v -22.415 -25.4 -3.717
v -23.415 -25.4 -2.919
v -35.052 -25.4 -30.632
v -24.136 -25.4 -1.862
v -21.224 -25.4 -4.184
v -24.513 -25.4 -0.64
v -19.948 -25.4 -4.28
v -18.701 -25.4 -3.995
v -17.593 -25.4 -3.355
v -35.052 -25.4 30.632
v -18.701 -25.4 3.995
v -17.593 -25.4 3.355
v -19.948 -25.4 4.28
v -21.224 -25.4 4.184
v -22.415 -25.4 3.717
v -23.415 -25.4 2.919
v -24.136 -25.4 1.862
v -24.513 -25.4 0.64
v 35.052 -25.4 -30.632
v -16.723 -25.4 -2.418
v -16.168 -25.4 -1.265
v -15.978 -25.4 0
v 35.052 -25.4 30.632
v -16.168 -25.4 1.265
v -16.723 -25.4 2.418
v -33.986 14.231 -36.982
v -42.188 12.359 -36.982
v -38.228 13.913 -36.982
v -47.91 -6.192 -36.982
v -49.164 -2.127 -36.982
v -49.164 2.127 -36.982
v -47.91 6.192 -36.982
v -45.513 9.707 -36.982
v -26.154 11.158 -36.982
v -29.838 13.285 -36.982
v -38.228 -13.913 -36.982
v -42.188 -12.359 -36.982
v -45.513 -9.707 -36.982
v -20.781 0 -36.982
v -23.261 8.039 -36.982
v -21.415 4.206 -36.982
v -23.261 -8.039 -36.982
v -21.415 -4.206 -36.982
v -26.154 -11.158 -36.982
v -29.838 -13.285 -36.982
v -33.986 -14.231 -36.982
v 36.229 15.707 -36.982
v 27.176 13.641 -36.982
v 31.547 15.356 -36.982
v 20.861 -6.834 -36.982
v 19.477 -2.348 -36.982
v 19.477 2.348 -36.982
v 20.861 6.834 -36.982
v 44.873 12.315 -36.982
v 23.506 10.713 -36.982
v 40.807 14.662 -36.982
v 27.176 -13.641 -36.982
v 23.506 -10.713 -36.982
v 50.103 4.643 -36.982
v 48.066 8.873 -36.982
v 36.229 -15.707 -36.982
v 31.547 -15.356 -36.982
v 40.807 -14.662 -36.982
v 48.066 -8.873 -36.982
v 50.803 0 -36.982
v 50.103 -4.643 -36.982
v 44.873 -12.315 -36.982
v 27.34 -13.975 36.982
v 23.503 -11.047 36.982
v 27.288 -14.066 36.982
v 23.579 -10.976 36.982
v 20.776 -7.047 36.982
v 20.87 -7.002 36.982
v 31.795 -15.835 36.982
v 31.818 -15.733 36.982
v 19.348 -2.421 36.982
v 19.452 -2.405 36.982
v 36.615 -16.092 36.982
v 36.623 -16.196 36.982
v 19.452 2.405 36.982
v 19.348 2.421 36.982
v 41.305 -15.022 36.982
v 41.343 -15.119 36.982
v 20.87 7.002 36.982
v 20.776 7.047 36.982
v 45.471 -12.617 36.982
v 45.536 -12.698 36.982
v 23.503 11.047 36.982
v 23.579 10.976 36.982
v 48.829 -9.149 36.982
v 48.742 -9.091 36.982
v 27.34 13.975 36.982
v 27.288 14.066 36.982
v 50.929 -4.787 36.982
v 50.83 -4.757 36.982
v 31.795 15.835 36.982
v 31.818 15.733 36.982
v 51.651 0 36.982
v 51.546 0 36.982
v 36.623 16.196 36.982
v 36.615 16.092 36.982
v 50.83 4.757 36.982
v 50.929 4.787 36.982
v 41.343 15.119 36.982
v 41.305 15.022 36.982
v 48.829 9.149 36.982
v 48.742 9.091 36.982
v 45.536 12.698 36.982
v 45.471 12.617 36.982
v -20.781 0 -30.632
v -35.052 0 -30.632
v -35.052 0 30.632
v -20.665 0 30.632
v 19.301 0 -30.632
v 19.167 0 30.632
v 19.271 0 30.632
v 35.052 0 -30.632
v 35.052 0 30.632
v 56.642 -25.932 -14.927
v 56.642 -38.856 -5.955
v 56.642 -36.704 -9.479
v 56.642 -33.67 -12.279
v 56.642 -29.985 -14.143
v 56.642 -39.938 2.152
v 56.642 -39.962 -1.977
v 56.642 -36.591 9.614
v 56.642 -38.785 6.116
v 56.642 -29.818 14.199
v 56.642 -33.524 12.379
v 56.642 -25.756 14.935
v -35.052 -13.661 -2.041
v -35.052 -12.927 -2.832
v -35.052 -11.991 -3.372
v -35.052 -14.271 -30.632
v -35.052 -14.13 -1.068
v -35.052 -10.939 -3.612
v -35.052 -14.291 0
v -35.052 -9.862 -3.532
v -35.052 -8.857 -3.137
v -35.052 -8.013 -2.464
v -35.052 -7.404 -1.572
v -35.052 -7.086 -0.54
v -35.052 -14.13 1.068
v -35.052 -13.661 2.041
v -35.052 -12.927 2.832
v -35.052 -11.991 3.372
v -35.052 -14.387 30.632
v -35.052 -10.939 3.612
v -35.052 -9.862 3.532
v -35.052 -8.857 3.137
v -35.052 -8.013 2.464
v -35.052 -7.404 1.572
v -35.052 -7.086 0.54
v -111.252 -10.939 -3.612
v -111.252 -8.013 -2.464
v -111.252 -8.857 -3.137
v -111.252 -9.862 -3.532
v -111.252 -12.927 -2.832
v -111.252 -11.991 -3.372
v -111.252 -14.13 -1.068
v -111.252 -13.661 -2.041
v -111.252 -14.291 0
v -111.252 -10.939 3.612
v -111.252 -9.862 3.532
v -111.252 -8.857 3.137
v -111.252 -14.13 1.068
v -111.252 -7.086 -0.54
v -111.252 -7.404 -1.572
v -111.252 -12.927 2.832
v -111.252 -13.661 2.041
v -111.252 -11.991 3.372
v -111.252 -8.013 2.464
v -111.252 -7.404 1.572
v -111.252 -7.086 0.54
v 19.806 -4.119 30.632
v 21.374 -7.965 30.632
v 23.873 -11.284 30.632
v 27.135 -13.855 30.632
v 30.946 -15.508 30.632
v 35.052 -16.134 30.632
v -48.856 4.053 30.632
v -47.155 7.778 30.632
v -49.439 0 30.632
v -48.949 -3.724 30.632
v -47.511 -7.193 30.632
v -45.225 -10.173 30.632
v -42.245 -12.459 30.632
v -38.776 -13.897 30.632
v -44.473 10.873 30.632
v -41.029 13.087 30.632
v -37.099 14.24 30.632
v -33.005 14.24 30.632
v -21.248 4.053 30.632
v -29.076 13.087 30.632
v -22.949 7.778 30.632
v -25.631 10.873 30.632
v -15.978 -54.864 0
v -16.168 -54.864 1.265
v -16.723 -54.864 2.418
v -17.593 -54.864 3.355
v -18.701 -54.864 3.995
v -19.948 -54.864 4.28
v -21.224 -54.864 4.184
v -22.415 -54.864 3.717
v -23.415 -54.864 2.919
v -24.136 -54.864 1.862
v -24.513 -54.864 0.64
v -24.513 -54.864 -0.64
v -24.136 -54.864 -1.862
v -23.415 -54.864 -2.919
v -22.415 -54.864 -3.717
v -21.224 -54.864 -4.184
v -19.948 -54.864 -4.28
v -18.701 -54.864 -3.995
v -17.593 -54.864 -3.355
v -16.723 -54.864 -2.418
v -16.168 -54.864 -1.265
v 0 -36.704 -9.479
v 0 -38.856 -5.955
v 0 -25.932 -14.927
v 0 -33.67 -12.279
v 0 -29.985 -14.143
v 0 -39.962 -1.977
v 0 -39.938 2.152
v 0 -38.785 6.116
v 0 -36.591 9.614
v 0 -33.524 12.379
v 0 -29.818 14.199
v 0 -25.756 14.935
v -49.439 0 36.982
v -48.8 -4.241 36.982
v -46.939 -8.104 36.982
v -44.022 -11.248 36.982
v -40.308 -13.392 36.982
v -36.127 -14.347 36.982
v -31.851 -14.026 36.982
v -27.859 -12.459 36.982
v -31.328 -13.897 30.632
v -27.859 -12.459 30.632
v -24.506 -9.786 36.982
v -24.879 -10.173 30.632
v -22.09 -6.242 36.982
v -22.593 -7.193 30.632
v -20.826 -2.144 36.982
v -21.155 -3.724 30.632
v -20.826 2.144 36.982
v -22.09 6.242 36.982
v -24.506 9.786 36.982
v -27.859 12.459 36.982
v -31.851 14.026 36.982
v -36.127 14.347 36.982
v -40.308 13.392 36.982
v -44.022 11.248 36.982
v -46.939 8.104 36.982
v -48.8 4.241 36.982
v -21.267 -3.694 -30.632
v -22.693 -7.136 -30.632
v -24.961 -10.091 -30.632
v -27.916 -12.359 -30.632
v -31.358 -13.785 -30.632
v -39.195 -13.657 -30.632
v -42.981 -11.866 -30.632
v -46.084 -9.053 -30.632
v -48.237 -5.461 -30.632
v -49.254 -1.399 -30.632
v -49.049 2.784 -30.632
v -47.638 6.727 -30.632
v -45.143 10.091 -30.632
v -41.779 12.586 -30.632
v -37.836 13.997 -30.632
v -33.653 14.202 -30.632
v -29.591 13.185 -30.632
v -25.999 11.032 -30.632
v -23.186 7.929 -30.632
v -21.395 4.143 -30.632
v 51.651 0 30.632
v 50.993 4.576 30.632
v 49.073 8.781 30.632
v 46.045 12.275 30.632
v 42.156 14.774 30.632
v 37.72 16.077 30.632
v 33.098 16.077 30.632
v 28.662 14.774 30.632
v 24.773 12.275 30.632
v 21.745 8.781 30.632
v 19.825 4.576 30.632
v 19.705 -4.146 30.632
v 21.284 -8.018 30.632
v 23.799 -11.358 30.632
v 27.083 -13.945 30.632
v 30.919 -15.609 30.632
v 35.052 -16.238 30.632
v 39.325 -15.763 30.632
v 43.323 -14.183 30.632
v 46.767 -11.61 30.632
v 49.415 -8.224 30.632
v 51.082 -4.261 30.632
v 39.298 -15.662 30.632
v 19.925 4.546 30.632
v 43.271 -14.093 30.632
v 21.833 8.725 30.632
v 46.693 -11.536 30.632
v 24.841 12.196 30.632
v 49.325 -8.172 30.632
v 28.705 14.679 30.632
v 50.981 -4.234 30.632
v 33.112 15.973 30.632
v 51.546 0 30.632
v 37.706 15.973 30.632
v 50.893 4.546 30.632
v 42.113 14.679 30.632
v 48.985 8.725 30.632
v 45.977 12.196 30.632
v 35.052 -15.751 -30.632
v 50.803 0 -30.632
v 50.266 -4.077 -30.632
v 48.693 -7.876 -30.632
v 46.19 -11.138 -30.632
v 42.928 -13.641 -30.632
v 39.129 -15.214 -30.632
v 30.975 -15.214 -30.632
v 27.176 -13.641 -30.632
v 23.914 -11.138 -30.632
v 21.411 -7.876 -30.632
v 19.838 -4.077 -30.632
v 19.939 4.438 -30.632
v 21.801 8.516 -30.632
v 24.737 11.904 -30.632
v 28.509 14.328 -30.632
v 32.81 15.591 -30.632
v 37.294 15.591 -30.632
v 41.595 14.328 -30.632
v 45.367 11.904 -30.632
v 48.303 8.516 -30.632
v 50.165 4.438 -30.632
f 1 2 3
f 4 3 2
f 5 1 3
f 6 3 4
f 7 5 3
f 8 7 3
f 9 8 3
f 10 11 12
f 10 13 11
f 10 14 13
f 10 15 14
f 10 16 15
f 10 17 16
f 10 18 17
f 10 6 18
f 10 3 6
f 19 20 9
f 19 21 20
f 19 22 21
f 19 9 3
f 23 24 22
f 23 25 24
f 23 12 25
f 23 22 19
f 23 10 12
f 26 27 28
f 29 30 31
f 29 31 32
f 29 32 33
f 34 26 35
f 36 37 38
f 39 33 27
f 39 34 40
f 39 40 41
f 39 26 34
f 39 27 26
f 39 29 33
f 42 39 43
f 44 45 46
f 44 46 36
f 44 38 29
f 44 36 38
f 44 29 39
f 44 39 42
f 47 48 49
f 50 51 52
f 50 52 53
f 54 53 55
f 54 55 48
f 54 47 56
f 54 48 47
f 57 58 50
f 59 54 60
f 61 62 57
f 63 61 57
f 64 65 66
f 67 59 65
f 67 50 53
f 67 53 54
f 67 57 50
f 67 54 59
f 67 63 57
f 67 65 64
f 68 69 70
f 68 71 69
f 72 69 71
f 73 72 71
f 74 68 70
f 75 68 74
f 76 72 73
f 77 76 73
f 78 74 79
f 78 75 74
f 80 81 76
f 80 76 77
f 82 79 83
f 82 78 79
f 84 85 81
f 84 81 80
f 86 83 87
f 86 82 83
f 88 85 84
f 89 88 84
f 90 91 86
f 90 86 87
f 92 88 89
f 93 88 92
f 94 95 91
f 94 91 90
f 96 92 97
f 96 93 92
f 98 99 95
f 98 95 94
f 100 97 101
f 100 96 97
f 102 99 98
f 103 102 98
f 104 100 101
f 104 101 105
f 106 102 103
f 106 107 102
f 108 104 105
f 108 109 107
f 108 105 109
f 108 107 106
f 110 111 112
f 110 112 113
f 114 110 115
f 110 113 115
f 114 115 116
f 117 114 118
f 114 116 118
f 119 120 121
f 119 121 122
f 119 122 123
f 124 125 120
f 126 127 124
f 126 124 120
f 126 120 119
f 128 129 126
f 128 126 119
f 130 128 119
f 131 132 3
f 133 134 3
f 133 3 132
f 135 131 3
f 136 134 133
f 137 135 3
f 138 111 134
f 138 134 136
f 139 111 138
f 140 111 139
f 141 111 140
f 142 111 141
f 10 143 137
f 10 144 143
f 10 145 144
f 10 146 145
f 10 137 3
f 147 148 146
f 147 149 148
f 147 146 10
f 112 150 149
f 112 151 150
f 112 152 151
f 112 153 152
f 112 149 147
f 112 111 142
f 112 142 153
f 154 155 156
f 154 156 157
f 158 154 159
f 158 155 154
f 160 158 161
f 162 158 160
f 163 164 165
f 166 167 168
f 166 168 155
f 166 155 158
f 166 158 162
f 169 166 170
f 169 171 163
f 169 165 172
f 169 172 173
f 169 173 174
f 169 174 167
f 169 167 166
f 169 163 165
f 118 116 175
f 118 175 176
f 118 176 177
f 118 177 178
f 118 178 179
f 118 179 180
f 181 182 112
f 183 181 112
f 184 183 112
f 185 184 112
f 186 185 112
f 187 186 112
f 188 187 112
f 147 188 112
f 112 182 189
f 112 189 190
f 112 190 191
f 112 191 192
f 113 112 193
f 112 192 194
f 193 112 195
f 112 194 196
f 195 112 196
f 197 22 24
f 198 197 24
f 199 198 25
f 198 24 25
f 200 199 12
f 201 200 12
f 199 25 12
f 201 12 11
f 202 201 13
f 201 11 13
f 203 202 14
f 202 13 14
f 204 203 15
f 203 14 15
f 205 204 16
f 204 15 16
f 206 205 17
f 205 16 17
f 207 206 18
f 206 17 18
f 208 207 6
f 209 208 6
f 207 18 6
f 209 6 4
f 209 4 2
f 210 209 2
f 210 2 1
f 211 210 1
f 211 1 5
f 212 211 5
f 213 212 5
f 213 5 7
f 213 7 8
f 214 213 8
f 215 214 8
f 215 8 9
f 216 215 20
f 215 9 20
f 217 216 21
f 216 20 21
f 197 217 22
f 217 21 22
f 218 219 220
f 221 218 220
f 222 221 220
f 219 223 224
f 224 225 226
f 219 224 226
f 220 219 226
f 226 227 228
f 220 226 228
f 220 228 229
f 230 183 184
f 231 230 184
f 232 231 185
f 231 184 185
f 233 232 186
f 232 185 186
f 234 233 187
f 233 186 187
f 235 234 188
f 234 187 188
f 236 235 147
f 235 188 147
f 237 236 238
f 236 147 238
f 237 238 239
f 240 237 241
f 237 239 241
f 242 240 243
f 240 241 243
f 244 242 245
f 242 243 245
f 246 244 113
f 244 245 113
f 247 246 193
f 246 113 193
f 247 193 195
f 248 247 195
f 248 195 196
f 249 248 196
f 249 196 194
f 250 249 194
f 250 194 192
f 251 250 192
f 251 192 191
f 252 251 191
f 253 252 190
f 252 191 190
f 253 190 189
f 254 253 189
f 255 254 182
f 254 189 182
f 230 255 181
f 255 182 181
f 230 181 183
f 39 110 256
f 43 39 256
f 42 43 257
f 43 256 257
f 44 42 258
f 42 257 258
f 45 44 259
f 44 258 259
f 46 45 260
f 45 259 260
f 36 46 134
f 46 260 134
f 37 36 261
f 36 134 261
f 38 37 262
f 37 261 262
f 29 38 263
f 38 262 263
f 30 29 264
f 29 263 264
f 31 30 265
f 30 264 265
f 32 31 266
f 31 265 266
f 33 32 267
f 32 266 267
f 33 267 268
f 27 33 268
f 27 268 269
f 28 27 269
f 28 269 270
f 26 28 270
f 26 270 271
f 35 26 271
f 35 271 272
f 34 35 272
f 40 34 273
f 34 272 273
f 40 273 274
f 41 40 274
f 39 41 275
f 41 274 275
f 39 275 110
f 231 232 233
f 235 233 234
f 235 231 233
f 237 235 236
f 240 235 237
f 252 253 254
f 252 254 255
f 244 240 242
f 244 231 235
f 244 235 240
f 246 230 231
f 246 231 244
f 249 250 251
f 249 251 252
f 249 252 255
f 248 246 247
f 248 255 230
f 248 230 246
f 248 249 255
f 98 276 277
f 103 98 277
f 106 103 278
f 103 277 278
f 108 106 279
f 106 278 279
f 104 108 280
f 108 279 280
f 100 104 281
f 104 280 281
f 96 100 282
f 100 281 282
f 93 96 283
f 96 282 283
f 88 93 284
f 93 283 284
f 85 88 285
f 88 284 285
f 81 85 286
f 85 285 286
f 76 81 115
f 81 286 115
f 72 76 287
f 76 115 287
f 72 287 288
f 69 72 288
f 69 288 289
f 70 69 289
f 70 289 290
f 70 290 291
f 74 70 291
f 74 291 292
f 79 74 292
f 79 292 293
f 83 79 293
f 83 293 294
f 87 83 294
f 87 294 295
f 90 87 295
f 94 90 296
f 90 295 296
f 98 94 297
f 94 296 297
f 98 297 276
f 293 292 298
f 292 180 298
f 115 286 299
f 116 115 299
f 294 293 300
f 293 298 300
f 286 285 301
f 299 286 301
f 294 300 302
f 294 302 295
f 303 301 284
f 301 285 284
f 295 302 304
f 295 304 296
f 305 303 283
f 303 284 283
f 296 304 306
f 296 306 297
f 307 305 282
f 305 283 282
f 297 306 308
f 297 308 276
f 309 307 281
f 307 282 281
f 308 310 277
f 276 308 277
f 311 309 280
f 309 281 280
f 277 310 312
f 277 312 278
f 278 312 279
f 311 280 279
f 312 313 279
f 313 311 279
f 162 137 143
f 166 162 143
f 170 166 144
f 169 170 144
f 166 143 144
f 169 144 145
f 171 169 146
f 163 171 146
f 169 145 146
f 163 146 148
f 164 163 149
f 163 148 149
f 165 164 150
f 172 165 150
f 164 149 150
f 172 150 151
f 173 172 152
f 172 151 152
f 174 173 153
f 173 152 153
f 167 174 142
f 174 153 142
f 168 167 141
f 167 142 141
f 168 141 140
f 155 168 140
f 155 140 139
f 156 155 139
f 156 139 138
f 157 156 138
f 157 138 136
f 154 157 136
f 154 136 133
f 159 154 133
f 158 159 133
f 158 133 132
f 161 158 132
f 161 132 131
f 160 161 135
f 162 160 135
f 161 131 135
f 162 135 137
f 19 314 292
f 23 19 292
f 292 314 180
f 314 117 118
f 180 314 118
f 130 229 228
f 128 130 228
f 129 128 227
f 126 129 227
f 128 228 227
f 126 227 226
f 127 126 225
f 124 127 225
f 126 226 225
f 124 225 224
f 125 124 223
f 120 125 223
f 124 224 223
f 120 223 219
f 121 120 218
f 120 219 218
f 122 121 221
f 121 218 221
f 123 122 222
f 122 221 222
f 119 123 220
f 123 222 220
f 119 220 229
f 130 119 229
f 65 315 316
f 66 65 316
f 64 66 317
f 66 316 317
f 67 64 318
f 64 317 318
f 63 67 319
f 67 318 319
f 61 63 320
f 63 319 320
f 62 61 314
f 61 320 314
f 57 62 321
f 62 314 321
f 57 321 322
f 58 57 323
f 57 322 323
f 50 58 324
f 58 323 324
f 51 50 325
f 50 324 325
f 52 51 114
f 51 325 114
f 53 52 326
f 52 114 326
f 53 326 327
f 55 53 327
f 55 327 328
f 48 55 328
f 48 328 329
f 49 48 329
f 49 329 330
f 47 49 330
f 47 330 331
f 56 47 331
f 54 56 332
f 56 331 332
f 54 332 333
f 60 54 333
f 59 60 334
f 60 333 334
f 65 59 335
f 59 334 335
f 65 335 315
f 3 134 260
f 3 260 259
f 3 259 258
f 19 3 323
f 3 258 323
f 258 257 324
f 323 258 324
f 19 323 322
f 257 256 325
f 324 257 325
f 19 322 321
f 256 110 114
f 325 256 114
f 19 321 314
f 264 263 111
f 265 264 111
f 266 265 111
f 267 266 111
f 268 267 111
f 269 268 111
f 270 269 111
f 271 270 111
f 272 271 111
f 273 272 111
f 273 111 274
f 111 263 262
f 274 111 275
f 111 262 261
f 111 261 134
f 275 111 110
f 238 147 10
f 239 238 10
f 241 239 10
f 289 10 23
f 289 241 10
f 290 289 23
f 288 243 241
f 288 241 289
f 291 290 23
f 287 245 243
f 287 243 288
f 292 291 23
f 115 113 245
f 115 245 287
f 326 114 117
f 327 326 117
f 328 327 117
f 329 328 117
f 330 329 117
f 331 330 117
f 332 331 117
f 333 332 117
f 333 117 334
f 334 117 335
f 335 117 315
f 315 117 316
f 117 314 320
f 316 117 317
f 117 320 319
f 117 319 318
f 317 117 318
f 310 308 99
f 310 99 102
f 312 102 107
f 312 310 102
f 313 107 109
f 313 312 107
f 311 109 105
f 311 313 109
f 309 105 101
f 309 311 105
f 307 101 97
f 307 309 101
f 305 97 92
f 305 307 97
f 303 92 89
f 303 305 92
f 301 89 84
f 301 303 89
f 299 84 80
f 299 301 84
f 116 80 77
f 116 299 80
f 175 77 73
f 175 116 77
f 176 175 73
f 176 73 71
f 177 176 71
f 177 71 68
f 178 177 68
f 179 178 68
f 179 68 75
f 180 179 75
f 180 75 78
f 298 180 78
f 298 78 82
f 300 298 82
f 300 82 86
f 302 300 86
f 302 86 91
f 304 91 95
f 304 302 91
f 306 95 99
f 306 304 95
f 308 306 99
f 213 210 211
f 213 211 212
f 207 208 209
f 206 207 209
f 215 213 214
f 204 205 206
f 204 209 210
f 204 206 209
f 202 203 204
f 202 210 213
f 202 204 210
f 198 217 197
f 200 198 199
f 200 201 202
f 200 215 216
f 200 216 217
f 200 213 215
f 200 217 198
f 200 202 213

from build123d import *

# Parameters (mm, degrees)
F0_W      = 70.1040104032
F0_H      = 61.2648017704
F1_DEPTH  = 25.4
F2_R      = 14.2710735732
F2_R_2    = 15.7510774592
F3_DEPTH  = 6.35
F4_R      = 16.2418969222
F4_R_2    = 16.137517132
F5_DEPTH  = 6.35
F6_R      = 3.6225069007
F7_DEPTH  = 76.2
F9_DEPTH  = 56.642
F10_R     = 4.2916230847
F11_DEPTH = 29.464


with BuildPart() as f1:
    # F0 (on Front) → F1 (new body)
    with BuildSketch(Plane.XZ):
        Rectangle(F0_W, F0_H)
    extrude(amount=F1_DEPTH)

    # F2 (on face) → F3 (join)
    with BuildSketch(Plane(origin=(0, 0, -30.6324008852), x_dir=(1, 0, 0), z_dir=(0, 0, -1))):
        with Locations((-35.0520052016, 0)):
            Circle(F2_R)
        with Locations((35.0520052016, 0)):
            Circle(F2_R_2)
    extrude(amount=F3_DEPTH)

    # F4 (on face) → F5 (join)
    with BuildSketch(Plane.XY.offset(30.6324008852)):
        with Locations((35.4089811444, 0)):
            Circle(F4_R)
        with Locations((35.4089811444, 0)):
            Circle(F4_R_2, mode=Mode.SUBTRACT)
        with BuildLine():
            ThreePointArc((-20.6651981894, 0), (-35.0520050245, 14.3868070122), (-49.4388122138, 3.541e-07))
            ThreePointArc((-49.4388122138, 3.541e-07), (-35.0520053786, -14.3868070122), (-20.6651981894, 0))
        make_face()
        with BuildLine():
            ThreePointArc((-49.4388122138, 3.541e-07), (-35.1685991603, 14.2702128764), (-20.8983864609, 0))
            ThreePointArc((-20.8983864609, 0), (-35.1685995144, -14.2702128764), (-49.4388122138, 3.541e-07))
        make_face(mode=Mode.SUBTRACT)
        with BuildLine():
            ThreePointArc((-49.4388122138, 3.541e-07), (-35.1685995144, -14.2702128764), (-20.8983864609, 0))
            ThreePointArc((-20.8983864609, 0), (-35.1685991603, 14.2702128764), (-49.4388122138, 3.541e-07))
        make_face()
    extrude(amount=F5_DEPTH)

    # F6 (on face) → F7 (join)
    with BuildSketch(Plane(origin=(-35.0520052016, 0, 0), x_dir=(0, -1, 0), z_dir=(-1, 0, 0))):
        with Locations((10.667999275, 0)):
            Circle(F6_R)
    extrude(amount=F7_DEPTH)

    # F10 (on face) → F11 (join)
    with BuildSketch(Plane.XZ.offset(25.4)):
        with Locations((-20.2692020684, 0)):
            Circle(F10_R)
    extrude(amount=F11_DEPTH)


with BuildPart() as f9:
    # F8 (on Right) → F9 (new body)
    with BuildSketch(Plane.YZ):
        with BuildLine():
            Line((-25.9316310254, -14.9269764392), (-25.7555991411, 14.9352010339))
            ThreePointArc((-25.7555991411, 14.9352010339), (-40.0933788082, 0.0881119575), (-25.9316310254, -14.9269764392))
        make_face()
    extrude(amount=F9_DEPTH)


solid = Compound([f1.part, f9.part])
